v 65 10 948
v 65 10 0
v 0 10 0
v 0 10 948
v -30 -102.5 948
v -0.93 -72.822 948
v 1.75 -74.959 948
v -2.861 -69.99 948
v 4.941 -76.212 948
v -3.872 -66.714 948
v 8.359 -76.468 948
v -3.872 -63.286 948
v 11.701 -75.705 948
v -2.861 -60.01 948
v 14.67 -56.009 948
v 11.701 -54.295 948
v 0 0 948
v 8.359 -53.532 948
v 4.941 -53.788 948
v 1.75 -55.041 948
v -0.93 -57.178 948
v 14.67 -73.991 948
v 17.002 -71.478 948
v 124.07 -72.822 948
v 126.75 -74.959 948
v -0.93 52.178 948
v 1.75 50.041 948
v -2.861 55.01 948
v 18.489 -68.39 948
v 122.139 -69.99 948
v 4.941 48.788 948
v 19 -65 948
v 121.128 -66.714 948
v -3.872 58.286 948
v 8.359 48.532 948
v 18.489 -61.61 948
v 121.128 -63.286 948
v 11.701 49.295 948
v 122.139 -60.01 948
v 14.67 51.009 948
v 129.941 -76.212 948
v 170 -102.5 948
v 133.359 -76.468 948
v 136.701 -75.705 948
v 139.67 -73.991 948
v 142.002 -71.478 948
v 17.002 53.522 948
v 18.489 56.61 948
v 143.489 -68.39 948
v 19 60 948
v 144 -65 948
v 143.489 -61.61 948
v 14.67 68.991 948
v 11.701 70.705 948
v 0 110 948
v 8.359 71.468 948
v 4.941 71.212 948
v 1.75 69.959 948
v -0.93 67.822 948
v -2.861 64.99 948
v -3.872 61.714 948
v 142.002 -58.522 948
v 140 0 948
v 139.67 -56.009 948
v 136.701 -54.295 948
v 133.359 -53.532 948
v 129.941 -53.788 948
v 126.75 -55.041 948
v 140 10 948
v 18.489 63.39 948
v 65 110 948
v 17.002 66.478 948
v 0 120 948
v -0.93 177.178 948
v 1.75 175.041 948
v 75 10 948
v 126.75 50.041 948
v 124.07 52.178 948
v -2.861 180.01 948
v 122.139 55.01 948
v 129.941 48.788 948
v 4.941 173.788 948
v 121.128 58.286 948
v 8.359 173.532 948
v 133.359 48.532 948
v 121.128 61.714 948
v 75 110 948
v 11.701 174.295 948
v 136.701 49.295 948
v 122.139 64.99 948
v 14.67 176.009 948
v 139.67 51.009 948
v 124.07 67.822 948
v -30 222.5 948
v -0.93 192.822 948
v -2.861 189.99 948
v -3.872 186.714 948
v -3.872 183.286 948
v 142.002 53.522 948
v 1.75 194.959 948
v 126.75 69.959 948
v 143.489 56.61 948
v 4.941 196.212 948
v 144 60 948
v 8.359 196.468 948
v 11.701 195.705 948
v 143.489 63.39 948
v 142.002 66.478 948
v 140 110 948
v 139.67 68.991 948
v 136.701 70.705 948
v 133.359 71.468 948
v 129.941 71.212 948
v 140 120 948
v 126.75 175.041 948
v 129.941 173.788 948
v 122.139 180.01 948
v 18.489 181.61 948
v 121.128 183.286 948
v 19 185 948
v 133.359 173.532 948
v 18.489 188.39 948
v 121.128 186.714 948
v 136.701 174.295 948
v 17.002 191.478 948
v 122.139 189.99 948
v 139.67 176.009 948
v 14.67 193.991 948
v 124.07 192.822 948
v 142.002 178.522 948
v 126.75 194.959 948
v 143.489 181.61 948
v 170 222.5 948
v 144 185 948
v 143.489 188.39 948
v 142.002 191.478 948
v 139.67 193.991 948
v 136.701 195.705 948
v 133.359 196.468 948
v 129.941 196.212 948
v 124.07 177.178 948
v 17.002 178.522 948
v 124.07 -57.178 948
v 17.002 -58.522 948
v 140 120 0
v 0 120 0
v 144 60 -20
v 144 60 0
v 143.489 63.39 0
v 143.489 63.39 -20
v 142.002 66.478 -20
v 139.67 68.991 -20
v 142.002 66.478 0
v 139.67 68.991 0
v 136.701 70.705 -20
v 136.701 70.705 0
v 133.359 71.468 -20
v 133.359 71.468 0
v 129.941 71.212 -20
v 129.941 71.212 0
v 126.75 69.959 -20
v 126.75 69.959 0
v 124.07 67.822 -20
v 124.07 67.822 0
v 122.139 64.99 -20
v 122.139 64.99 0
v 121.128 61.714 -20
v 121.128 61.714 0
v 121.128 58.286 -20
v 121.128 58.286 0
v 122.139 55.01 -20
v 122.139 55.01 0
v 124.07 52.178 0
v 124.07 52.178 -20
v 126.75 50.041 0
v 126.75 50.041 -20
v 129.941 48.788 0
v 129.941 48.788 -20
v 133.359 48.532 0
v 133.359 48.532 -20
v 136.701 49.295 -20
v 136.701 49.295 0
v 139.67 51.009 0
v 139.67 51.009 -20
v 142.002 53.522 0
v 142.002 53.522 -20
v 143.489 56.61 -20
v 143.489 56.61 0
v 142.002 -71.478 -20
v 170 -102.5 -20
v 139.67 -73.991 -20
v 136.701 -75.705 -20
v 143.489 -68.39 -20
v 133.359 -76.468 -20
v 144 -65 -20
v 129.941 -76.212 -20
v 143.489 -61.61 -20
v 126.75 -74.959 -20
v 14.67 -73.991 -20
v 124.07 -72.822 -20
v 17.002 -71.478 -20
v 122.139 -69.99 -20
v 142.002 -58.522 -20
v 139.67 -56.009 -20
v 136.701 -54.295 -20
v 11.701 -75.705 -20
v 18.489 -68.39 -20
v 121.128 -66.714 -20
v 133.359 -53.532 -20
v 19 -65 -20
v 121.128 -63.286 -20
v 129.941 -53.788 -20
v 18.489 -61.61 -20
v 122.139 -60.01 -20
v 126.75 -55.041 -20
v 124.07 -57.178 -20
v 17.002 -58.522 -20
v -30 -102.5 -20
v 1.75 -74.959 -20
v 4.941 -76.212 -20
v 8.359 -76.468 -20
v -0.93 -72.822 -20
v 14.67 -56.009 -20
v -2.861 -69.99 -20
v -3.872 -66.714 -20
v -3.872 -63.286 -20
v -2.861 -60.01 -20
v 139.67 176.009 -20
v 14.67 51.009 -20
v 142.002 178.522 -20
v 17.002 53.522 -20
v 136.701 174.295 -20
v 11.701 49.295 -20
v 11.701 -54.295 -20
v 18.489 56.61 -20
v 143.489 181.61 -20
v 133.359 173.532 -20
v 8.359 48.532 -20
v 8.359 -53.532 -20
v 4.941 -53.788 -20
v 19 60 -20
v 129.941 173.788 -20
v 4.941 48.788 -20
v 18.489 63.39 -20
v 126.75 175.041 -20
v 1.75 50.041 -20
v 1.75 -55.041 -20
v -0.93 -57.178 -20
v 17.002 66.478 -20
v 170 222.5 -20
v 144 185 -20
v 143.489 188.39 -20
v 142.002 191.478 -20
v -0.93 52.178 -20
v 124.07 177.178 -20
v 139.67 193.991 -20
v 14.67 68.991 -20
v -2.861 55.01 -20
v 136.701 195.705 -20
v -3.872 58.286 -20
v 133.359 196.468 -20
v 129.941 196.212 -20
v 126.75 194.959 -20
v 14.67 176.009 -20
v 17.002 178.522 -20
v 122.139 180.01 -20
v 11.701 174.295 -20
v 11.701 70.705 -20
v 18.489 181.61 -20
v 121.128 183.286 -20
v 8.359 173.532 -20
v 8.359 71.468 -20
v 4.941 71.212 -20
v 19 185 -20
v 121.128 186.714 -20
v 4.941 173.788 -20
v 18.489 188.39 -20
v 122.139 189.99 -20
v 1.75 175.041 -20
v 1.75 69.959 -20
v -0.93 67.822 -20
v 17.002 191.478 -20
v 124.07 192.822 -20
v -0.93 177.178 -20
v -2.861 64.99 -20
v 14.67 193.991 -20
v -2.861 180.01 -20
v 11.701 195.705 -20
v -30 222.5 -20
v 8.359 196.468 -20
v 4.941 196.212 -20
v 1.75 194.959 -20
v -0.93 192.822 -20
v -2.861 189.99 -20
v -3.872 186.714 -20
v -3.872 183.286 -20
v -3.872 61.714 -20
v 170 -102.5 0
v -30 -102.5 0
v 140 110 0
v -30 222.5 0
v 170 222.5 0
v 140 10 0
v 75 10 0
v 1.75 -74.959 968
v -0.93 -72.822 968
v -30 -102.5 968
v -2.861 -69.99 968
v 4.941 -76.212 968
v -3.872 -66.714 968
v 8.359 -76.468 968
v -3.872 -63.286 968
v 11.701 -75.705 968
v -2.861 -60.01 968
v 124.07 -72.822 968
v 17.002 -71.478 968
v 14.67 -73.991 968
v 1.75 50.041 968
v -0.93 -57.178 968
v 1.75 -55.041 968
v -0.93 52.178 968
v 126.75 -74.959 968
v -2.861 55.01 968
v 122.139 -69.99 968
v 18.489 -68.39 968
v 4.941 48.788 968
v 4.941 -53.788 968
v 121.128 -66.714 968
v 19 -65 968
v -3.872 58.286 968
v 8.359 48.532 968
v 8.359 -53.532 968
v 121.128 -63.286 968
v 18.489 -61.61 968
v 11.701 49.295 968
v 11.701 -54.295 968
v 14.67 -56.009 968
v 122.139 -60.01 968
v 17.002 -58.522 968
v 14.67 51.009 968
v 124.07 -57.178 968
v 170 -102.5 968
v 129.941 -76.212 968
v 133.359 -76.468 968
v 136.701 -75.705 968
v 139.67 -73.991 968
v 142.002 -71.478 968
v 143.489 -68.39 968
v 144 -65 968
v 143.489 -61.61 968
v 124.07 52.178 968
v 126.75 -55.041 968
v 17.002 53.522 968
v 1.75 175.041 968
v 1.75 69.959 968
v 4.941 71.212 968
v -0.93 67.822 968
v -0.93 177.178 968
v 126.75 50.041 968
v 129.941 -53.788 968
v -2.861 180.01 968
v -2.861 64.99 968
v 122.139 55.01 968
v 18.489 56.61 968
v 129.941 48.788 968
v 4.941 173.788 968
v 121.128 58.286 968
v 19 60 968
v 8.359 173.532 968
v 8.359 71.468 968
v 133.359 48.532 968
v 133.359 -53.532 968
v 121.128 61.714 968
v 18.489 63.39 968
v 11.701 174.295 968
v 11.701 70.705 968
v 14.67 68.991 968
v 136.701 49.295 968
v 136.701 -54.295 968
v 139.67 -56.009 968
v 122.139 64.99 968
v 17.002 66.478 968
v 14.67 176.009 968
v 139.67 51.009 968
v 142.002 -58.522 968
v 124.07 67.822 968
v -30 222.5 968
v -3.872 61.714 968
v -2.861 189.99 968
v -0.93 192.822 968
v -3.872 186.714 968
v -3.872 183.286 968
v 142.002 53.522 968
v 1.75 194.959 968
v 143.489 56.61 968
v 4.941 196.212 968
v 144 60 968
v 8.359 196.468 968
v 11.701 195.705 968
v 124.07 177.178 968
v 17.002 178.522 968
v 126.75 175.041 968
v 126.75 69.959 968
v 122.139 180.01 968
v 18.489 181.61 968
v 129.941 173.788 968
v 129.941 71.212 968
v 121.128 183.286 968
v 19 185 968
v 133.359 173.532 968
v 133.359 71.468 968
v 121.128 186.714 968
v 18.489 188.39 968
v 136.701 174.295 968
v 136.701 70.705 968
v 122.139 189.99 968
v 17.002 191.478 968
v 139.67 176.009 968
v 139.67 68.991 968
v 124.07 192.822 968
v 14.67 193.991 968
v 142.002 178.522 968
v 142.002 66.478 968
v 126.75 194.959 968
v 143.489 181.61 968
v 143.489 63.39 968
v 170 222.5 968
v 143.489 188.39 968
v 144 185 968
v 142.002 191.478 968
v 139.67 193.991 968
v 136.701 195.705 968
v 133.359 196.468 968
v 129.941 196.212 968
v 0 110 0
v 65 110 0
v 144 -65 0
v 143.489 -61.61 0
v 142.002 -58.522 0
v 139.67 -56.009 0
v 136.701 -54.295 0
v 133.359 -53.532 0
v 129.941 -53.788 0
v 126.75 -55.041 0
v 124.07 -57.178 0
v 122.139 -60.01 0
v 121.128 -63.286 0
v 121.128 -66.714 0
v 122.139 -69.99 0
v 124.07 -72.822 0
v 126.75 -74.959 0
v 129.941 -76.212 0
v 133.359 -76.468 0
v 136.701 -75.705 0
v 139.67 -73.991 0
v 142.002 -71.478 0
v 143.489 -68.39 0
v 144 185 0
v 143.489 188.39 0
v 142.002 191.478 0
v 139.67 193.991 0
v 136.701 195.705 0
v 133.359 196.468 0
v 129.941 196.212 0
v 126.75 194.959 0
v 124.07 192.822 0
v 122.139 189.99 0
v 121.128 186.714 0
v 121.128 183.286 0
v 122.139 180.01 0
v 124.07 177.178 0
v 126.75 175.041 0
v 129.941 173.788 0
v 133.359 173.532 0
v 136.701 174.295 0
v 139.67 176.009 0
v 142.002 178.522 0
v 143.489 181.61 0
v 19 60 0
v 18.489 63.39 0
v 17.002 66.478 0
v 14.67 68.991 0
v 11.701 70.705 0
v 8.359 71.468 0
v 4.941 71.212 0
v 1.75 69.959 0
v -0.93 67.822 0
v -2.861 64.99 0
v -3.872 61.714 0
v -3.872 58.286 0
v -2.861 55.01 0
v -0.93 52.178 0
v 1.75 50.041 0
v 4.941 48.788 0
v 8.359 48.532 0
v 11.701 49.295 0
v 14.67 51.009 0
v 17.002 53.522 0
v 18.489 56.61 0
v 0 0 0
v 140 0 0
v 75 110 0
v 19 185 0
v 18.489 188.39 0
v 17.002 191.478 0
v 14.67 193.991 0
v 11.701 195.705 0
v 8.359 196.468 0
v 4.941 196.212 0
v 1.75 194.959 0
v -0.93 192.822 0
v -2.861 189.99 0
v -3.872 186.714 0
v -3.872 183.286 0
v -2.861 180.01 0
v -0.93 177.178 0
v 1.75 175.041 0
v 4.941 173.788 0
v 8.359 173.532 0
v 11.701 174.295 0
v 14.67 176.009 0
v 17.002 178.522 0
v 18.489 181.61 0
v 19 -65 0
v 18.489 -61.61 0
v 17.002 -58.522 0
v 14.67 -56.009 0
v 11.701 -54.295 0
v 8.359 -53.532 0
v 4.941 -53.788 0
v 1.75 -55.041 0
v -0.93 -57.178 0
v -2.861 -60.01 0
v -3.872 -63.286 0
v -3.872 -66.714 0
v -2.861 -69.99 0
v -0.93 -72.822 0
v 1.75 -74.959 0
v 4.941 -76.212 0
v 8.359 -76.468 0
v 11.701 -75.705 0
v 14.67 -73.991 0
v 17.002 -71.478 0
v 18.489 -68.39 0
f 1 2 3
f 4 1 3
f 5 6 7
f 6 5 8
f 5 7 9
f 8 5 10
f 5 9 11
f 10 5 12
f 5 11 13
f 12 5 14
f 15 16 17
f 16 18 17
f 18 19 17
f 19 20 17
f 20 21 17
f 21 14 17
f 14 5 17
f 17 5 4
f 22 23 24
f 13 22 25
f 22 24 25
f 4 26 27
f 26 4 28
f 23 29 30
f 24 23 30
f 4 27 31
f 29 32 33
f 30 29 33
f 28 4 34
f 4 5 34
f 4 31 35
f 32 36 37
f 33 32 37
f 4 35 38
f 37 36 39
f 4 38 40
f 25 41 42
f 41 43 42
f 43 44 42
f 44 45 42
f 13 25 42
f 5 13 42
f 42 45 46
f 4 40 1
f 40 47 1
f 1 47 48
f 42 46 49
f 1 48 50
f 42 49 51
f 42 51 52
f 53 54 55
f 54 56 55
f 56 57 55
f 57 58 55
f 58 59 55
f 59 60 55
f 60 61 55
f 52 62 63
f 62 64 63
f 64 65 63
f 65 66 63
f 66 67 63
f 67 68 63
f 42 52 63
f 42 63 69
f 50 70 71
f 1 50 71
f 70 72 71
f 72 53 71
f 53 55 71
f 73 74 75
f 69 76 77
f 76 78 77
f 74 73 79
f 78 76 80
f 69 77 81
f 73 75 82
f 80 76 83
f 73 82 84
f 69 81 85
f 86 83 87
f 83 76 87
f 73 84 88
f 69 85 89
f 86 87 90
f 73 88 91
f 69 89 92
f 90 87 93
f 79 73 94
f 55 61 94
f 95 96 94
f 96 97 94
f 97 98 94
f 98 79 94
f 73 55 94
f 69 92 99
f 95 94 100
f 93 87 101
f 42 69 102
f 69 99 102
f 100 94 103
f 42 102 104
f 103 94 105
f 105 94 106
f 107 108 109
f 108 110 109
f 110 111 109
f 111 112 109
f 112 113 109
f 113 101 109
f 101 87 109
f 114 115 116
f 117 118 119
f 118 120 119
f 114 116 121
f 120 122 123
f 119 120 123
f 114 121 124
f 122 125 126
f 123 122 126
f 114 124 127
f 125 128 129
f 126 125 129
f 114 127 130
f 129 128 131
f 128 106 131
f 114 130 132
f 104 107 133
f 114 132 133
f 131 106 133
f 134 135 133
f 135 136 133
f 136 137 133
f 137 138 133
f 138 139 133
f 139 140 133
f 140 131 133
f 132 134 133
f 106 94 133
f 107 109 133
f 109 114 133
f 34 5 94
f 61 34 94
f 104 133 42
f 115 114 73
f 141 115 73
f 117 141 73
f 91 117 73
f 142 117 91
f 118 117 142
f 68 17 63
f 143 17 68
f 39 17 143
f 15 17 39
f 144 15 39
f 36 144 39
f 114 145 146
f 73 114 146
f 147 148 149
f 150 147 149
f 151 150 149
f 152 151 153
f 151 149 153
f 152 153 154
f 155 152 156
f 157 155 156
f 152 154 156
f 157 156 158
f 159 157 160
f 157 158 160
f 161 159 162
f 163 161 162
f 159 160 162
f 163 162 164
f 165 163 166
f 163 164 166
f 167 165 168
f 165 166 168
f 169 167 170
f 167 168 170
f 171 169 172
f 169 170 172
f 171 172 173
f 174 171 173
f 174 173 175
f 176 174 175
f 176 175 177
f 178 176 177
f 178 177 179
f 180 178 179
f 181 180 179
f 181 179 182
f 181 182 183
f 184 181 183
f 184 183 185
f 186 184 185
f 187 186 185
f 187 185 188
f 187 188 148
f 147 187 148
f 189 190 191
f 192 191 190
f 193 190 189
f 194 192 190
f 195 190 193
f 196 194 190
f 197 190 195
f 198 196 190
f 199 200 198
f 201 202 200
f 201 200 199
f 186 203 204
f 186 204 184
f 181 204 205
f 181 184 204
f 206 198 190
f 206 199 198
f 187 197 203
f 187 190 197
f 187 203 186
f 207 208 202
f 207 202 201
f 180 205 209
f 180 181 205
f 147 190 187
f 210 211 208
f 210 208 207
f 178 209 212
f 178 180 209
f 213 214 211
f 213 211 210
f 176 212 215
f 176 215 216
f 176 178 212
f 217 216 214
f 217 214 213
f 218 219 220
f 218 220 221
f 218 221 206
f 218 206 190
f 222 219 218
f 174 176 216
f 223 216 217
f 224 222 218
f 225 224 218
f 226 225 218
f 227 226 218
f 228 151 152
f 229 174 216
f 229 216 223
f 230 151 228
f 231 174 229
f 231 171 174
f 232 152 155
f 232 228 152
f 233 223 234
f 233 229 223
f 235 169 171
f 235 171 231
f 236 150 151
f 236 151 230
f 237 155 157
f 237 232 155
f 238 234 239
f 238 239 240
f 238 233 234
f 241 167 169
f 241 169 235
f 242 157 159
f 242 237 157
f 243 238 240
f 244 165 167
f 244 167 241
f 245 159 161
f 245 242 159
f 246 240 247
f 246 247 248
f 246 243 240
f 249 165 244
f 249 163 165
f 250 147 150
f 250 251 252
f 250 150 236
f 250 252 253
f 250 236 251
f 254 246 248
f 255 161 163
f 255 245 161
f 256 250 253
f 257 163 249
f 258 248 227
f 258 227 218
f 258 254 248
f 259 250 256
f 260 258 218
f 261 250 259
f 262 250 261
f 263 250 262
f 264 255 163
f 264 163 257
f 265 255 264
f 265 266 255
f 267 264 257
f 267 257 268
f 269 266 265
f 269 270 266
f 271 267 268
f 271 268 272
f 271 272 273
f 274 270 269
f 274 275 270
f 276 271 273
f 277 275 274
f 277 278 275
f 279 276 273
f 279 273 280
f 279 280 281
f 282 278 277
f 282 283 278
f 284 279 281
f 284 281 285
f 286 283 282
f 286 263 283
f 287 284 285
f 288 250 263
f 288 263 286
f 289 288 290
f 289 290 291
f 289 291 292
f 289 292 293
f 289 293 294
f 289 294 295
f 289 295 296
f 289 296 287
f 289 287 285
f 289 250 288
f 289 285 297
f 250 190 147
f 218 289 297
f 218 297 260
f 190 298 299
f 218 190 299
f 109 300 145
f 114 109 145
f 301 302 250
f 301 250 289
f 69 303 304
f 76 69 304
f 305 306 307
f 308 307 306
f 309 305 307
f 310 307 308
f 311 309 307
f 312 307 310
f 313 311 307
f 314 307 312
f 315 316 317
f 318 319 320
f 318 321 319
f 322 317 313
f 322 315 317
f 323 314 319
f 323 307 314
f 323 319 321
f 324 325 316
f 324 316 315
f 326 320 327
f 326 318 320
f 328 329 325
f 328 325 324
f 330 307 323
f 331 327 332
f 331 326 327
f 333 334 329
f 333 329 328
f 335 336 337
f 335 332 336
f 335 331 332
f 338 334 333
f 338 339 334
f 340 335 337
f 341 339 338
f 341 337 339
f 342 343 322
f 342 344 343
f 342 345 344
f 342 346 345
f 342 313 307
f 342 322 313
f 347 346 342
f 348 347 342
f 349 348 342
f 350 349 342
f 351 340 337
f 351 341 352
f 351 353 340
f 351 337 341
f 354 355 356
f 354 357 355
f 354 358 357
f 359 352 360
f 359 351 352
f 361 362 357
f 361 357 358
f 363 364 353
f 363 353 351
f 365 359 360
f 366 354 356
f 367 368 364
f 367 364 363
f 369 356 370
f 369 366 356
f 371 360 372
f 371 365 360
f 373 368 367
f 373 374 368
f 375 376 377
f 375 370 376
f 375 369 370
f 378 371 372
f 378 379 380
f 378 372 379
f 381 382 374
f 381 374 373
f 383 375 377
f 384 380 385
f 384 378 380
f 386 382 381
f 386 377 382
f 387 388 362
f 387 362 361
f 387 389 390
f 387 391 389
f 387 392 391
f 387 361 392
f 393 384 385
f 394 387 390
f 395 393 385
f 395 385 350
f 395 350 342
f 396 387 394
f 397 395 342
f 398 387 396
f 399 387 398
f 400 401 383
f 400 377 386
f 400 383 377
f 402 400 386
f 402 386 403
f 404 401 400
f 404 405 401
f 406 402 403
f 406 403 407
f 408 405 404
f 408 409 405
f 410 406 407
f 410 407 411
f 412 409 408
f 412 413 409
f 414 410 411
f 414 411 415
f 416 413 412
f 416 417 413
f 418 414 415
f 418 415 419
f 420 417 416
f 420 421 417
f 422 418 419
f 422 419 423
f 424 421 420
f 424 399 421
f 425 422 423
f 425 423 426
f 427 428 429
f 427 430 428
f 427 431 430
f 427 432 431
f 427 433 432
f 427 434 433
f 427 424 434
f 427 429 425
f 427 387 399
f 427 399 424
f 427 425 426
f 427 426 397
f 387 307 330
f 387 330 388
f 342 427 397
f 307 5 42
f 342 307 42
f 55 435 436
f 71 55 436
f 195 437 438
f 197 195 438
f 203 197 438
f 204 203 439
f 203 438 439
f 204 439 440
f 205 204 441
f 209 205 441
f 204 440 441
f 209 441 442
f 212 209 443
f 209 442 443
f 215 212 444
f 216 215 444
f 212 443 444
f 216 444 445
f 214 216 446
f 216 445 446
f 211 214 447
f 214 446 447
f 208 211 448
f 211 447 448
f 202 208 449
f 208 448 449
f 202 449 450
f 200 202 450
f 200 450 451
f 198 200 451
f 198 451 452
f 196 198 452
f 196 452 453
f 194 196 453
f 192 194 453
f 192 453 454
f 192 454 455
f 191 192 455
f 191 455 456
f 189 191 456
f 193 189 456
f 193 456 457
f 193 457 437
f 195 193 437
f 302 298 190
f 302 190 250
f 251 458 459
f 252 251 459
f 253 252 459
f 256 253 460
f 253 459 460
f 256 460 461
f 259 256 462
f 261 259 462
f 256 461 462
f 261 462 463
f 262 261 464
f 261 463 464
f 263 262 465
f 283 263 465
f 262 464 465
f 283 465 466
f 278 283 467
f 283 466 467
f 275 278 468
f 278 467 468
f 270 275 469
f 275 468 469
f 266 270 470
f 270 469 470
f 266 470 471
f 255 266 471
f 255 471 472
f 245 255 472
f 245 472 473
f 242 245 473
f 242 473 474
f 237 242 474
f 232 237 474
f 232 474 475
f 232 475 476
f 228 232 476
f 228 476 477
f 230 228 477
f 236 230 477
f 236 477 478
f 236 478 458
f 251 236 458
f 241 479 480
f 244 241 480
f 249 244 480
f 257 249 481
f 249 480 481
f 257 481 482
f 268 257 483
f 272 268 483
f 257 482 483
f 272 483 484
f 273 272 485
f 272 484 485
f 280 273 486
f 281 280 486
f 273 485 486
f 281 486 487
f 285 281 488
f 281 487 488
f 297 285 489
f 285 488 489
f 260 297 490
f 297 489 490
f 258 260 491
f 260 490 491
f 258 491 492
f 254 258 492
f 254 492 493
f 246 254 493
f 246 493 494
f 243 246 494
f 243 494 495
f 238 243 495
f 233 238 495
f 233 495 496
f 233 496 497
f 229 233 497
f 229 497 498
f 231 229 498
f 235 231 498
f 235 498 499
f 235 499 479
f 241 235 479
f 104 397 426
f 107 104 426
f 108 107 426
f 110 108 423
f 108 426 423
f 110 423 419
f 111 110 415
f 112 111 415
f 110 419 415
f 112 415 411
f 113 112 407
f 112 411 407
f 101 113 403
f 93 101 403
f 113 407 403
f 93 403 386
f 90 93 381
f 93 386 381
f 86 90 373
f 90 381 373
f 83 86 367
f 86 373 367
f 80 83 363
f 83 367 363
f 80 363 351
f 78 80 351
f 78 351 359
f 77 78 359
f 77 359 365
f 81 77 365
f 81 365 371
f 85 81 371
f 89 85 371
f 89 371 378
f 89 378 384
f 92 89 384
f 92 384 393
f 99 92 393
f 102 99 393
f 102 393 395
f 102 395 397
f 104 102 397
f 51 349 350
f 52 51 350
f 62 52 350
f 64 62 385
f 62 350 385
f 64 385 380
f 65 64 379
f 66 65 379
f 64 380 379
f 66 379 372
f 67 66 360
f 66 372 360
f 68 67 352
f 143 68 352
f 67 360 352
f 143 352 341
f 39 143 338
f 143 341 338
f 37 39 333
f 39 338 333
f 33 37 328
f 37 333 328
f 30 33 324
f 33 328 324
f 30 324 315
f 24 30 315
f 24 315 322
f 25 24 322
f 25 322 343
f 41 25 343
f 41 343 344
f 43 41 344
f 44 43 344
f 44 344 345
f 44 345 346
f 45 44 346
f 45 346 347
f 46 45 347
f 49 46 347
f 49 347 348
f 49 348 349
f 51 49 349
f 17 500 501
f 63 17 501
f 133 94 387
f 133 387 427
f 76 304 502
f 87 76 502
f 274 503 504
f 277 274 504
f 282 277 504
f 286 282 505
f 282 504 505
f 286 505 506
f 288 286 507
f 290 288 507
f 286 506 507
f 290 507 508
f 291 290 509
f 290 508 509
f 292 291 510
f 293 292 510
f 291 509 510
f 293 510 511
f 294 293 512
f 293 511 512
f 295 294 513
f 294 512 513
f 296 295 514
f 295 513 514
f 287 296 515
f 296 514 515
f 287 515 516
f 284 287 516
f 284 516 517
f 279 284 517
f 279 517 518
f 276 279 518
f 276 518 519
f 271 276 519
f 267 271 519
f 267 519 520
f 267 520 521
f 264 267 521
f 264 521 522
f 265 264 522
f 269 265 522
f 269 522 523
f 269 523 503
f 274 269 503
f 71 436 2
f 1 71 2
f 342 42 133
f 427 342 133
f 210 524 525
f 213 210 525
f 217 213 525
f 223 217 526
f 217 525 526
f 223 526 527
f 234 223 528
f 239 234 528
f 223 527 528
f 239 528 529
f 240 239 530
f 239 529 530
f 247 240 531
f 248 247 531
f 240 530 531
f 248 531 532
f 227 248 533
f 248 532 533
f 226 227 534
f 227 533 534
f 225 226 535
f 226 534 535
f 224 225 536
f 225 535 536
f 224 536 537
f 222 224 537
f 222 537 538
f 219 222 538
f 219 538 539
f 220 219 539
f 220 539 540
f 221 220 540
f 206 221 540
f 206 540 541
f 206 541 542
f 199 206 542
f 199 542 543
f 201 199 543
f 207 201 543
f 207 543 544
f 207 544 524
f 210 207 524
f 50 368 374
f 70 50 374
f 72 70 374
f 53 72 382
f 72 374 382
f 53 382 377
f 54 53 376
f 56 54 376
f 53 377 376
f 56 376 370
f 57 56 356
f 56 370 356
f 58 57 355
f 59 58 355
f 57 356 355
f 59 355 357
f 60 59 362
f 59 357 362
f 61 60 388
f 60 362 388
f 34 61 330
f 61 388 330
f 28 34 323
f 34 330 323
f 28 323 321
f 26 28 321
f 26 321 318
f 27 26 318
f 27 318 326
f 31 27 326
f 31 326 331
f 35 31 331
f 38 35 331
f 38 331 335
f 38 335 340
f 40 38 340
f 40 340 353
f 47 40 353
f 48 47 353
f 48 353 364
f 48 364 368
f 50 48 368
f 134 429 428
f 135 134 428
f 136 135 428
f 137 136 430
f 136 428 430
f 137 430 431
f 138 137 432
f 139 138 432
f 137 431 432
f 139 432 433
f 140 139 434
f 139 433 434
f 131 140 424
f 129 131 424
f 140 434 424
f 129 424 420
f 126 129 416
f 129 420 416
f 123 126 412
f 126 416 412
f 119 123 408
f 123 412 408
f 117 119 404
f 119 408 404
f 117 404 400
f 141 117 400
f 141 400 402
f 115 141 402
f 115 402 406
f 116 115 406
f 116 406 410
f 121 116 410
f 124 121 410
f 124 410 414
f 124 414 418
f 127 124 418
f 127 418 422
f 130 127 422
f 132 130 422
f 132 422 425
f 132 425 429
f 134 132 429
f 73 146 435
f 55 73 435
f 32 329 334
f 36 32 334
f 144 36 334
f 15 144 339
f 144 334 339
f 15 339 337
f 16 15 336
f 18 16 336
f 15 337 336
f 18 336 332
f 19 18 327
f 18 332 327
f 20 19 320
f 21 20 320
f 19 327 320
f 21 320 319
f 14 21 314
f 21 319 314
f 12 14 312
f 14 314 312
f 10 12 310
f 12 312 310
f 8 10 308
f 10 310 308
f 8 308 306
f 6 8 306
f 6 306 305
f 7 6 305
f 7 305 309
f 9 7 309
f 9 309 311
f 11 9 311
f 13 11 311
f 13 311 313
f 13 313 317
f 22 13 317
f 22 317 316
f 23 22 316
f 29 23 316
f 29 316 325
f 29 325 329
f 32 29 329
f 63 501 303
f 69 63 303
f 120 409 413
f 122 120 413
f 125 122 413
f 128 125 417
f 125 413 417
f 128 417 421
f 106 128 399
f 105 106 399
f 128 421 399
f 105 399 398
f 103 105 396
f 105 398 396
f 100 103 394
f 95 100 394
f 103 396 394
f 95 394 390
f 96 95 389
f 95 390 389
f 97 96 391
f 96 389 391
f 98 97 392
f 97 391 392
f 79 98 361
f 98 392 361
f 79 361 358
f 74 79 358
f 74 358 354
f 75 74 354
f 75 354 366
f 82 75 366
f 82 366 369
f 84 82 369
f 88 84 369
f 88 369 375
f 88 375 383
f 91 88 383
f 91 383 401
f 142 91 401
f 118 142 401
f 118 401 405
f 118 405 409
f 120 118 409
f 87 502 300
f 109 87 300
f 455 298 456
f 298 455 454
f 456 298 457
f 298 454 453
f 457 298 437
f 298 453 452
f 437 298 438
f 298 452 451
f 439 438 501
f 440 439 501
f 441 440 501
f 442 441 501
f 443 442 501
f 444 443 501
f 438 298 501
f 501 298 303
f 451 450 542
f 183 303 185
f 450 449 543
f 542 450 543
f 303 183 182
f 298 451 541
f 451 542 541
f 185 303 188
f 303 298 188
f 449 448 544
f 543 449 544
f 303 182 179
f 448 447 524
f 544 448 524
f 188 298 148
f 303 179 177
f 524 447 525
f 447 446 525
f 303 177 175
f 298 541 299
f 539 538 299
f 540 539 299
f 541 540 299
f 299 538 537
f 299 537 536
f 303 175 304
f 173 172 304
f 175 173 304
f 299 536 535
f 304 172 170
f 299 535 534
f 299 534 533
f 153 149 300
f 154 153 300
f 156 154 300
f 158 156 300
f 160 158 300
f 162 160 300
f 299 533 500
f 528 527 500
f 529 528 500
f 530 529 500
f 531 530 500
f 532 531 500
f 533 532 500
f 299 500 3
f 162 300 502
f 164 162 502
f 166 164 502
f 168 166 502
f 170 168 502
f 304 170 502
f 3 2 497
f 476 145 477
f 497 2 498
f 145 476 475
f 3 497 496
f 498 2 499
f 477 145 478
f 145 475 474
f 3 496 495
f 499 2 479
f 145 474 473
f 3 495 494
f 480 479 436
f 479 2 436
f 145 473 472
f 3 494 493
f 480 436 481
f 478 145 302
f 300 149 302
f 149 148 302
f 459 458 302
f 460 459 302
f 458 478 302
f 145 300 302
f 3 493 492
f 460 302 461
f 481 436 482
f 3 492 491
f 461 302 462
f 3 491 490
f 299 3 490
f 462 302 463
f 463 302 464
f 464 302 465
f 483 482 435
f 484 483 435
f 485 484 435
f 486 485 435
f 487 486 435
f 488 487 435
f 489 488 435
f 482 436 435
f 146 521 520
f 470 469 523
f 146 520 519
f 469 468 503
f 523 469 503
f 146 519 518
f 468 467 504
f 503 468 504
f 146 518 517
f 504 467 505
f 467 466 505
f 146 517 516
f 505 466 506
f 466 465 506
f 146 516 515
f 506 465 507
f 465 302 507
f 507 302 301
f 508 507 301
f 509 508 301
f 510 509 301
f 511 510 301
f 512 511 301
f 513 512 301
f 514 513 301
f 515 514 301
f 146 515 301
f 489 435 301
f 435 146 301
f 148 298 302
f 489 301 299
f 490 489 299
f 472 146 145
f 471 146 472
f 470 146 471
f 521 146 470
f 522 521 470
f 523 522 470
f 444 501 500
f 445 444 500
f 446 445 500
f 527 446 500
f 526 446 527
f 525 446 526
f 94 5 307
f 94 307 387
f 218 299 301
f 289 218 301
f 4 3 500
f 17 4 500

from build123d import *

# Parameters (mm, degrees)
EXTRUDE_1_DEPTH             = 948
SKETCH_2_W                  = 200
SKETCH_2_H                  = 325
EXTRUDE_2_DEPTH             = 20
SKETCH_3_W                  = 200
SKETCH_3_H                  = 325
EXTRUDE_3_DEPTH             = 20
SKETCH_4_R                  = 11.5
CUT_EXTRUDE_1_DEPTH         = 1027.912970996
PATTERN_LINEAR_1_COUNT      = 2
PATTERN_LINEAR_1_PITCH      = 125
PATTERN_LINEAR_1_COUNT_DIR2 = 3
PATTERN_LINEAR_1_PITCH_DIR2 = 125


with BuildPart() as part:
    # 草图1 → 凸台-拉伸1 (new body)
    with BuildSketch(Plane.XY):
        Polygon((0, 120), (0, 110), (65, 110), (65, 10), (0, 10), (0, 0), (140, 0), (140, 10), (75, 10), (75, 110), (140, 110), (140, 120), align=None)
    extrude(amount=EXTRUDE_1_DEPTH)

    # 草图2 → 凸台-拉伸2 (add)
    with BuildSketch(Plane.XY.offset(948)):
        with Locations((70, 60)):
            Rectangle(SKETCH_2_W, SKETCH_2_H)
    extrude(amount=EXTRUDE_2_DEPTH)

    # 草图3 → 凸台-拉伸3 (add)
    with BuildSketch(Plane(origin=(0, 0, 0), x_dir=(-1, 0, 0), z_dir=(0, 0, -1))):
        with Locations((-70, 60)):
            Rectangle(SKETCH_3_W, SKETCH_3_H)
    extrude(amount=EXTRUDE_3_DEPTH)

    # 草图4 → 切除-拉伸1 (cut, through all)
    with BuildSketch(Plane.XY.offset(968)):
        with Locations((7.5, 185)):
            Circle(SKETCH_4_R)
    cut_extrude_1 = extrude(amount=-CUT_EXTRUDE_1_DEPTH, mode=Mode.SUBTRACT)

    # 阵列(线性)1: Cut-Extrude 1 2 × 3
    with Locations(*[(i * PATTERN_LINEAR_1_PITCH, -j * PATTERN_LINEAR_1_PITCH_DIR2, 0) for i in range(PATTERN_LINEAR_1_COUNT) for j in range(PATTERN_LINEAR_1_COUNT_DIR2) if (i, j) != (0, 0)]):
        add(cut_extrude_1, mode=Mode.SUBTRACT)


solid = part.part
